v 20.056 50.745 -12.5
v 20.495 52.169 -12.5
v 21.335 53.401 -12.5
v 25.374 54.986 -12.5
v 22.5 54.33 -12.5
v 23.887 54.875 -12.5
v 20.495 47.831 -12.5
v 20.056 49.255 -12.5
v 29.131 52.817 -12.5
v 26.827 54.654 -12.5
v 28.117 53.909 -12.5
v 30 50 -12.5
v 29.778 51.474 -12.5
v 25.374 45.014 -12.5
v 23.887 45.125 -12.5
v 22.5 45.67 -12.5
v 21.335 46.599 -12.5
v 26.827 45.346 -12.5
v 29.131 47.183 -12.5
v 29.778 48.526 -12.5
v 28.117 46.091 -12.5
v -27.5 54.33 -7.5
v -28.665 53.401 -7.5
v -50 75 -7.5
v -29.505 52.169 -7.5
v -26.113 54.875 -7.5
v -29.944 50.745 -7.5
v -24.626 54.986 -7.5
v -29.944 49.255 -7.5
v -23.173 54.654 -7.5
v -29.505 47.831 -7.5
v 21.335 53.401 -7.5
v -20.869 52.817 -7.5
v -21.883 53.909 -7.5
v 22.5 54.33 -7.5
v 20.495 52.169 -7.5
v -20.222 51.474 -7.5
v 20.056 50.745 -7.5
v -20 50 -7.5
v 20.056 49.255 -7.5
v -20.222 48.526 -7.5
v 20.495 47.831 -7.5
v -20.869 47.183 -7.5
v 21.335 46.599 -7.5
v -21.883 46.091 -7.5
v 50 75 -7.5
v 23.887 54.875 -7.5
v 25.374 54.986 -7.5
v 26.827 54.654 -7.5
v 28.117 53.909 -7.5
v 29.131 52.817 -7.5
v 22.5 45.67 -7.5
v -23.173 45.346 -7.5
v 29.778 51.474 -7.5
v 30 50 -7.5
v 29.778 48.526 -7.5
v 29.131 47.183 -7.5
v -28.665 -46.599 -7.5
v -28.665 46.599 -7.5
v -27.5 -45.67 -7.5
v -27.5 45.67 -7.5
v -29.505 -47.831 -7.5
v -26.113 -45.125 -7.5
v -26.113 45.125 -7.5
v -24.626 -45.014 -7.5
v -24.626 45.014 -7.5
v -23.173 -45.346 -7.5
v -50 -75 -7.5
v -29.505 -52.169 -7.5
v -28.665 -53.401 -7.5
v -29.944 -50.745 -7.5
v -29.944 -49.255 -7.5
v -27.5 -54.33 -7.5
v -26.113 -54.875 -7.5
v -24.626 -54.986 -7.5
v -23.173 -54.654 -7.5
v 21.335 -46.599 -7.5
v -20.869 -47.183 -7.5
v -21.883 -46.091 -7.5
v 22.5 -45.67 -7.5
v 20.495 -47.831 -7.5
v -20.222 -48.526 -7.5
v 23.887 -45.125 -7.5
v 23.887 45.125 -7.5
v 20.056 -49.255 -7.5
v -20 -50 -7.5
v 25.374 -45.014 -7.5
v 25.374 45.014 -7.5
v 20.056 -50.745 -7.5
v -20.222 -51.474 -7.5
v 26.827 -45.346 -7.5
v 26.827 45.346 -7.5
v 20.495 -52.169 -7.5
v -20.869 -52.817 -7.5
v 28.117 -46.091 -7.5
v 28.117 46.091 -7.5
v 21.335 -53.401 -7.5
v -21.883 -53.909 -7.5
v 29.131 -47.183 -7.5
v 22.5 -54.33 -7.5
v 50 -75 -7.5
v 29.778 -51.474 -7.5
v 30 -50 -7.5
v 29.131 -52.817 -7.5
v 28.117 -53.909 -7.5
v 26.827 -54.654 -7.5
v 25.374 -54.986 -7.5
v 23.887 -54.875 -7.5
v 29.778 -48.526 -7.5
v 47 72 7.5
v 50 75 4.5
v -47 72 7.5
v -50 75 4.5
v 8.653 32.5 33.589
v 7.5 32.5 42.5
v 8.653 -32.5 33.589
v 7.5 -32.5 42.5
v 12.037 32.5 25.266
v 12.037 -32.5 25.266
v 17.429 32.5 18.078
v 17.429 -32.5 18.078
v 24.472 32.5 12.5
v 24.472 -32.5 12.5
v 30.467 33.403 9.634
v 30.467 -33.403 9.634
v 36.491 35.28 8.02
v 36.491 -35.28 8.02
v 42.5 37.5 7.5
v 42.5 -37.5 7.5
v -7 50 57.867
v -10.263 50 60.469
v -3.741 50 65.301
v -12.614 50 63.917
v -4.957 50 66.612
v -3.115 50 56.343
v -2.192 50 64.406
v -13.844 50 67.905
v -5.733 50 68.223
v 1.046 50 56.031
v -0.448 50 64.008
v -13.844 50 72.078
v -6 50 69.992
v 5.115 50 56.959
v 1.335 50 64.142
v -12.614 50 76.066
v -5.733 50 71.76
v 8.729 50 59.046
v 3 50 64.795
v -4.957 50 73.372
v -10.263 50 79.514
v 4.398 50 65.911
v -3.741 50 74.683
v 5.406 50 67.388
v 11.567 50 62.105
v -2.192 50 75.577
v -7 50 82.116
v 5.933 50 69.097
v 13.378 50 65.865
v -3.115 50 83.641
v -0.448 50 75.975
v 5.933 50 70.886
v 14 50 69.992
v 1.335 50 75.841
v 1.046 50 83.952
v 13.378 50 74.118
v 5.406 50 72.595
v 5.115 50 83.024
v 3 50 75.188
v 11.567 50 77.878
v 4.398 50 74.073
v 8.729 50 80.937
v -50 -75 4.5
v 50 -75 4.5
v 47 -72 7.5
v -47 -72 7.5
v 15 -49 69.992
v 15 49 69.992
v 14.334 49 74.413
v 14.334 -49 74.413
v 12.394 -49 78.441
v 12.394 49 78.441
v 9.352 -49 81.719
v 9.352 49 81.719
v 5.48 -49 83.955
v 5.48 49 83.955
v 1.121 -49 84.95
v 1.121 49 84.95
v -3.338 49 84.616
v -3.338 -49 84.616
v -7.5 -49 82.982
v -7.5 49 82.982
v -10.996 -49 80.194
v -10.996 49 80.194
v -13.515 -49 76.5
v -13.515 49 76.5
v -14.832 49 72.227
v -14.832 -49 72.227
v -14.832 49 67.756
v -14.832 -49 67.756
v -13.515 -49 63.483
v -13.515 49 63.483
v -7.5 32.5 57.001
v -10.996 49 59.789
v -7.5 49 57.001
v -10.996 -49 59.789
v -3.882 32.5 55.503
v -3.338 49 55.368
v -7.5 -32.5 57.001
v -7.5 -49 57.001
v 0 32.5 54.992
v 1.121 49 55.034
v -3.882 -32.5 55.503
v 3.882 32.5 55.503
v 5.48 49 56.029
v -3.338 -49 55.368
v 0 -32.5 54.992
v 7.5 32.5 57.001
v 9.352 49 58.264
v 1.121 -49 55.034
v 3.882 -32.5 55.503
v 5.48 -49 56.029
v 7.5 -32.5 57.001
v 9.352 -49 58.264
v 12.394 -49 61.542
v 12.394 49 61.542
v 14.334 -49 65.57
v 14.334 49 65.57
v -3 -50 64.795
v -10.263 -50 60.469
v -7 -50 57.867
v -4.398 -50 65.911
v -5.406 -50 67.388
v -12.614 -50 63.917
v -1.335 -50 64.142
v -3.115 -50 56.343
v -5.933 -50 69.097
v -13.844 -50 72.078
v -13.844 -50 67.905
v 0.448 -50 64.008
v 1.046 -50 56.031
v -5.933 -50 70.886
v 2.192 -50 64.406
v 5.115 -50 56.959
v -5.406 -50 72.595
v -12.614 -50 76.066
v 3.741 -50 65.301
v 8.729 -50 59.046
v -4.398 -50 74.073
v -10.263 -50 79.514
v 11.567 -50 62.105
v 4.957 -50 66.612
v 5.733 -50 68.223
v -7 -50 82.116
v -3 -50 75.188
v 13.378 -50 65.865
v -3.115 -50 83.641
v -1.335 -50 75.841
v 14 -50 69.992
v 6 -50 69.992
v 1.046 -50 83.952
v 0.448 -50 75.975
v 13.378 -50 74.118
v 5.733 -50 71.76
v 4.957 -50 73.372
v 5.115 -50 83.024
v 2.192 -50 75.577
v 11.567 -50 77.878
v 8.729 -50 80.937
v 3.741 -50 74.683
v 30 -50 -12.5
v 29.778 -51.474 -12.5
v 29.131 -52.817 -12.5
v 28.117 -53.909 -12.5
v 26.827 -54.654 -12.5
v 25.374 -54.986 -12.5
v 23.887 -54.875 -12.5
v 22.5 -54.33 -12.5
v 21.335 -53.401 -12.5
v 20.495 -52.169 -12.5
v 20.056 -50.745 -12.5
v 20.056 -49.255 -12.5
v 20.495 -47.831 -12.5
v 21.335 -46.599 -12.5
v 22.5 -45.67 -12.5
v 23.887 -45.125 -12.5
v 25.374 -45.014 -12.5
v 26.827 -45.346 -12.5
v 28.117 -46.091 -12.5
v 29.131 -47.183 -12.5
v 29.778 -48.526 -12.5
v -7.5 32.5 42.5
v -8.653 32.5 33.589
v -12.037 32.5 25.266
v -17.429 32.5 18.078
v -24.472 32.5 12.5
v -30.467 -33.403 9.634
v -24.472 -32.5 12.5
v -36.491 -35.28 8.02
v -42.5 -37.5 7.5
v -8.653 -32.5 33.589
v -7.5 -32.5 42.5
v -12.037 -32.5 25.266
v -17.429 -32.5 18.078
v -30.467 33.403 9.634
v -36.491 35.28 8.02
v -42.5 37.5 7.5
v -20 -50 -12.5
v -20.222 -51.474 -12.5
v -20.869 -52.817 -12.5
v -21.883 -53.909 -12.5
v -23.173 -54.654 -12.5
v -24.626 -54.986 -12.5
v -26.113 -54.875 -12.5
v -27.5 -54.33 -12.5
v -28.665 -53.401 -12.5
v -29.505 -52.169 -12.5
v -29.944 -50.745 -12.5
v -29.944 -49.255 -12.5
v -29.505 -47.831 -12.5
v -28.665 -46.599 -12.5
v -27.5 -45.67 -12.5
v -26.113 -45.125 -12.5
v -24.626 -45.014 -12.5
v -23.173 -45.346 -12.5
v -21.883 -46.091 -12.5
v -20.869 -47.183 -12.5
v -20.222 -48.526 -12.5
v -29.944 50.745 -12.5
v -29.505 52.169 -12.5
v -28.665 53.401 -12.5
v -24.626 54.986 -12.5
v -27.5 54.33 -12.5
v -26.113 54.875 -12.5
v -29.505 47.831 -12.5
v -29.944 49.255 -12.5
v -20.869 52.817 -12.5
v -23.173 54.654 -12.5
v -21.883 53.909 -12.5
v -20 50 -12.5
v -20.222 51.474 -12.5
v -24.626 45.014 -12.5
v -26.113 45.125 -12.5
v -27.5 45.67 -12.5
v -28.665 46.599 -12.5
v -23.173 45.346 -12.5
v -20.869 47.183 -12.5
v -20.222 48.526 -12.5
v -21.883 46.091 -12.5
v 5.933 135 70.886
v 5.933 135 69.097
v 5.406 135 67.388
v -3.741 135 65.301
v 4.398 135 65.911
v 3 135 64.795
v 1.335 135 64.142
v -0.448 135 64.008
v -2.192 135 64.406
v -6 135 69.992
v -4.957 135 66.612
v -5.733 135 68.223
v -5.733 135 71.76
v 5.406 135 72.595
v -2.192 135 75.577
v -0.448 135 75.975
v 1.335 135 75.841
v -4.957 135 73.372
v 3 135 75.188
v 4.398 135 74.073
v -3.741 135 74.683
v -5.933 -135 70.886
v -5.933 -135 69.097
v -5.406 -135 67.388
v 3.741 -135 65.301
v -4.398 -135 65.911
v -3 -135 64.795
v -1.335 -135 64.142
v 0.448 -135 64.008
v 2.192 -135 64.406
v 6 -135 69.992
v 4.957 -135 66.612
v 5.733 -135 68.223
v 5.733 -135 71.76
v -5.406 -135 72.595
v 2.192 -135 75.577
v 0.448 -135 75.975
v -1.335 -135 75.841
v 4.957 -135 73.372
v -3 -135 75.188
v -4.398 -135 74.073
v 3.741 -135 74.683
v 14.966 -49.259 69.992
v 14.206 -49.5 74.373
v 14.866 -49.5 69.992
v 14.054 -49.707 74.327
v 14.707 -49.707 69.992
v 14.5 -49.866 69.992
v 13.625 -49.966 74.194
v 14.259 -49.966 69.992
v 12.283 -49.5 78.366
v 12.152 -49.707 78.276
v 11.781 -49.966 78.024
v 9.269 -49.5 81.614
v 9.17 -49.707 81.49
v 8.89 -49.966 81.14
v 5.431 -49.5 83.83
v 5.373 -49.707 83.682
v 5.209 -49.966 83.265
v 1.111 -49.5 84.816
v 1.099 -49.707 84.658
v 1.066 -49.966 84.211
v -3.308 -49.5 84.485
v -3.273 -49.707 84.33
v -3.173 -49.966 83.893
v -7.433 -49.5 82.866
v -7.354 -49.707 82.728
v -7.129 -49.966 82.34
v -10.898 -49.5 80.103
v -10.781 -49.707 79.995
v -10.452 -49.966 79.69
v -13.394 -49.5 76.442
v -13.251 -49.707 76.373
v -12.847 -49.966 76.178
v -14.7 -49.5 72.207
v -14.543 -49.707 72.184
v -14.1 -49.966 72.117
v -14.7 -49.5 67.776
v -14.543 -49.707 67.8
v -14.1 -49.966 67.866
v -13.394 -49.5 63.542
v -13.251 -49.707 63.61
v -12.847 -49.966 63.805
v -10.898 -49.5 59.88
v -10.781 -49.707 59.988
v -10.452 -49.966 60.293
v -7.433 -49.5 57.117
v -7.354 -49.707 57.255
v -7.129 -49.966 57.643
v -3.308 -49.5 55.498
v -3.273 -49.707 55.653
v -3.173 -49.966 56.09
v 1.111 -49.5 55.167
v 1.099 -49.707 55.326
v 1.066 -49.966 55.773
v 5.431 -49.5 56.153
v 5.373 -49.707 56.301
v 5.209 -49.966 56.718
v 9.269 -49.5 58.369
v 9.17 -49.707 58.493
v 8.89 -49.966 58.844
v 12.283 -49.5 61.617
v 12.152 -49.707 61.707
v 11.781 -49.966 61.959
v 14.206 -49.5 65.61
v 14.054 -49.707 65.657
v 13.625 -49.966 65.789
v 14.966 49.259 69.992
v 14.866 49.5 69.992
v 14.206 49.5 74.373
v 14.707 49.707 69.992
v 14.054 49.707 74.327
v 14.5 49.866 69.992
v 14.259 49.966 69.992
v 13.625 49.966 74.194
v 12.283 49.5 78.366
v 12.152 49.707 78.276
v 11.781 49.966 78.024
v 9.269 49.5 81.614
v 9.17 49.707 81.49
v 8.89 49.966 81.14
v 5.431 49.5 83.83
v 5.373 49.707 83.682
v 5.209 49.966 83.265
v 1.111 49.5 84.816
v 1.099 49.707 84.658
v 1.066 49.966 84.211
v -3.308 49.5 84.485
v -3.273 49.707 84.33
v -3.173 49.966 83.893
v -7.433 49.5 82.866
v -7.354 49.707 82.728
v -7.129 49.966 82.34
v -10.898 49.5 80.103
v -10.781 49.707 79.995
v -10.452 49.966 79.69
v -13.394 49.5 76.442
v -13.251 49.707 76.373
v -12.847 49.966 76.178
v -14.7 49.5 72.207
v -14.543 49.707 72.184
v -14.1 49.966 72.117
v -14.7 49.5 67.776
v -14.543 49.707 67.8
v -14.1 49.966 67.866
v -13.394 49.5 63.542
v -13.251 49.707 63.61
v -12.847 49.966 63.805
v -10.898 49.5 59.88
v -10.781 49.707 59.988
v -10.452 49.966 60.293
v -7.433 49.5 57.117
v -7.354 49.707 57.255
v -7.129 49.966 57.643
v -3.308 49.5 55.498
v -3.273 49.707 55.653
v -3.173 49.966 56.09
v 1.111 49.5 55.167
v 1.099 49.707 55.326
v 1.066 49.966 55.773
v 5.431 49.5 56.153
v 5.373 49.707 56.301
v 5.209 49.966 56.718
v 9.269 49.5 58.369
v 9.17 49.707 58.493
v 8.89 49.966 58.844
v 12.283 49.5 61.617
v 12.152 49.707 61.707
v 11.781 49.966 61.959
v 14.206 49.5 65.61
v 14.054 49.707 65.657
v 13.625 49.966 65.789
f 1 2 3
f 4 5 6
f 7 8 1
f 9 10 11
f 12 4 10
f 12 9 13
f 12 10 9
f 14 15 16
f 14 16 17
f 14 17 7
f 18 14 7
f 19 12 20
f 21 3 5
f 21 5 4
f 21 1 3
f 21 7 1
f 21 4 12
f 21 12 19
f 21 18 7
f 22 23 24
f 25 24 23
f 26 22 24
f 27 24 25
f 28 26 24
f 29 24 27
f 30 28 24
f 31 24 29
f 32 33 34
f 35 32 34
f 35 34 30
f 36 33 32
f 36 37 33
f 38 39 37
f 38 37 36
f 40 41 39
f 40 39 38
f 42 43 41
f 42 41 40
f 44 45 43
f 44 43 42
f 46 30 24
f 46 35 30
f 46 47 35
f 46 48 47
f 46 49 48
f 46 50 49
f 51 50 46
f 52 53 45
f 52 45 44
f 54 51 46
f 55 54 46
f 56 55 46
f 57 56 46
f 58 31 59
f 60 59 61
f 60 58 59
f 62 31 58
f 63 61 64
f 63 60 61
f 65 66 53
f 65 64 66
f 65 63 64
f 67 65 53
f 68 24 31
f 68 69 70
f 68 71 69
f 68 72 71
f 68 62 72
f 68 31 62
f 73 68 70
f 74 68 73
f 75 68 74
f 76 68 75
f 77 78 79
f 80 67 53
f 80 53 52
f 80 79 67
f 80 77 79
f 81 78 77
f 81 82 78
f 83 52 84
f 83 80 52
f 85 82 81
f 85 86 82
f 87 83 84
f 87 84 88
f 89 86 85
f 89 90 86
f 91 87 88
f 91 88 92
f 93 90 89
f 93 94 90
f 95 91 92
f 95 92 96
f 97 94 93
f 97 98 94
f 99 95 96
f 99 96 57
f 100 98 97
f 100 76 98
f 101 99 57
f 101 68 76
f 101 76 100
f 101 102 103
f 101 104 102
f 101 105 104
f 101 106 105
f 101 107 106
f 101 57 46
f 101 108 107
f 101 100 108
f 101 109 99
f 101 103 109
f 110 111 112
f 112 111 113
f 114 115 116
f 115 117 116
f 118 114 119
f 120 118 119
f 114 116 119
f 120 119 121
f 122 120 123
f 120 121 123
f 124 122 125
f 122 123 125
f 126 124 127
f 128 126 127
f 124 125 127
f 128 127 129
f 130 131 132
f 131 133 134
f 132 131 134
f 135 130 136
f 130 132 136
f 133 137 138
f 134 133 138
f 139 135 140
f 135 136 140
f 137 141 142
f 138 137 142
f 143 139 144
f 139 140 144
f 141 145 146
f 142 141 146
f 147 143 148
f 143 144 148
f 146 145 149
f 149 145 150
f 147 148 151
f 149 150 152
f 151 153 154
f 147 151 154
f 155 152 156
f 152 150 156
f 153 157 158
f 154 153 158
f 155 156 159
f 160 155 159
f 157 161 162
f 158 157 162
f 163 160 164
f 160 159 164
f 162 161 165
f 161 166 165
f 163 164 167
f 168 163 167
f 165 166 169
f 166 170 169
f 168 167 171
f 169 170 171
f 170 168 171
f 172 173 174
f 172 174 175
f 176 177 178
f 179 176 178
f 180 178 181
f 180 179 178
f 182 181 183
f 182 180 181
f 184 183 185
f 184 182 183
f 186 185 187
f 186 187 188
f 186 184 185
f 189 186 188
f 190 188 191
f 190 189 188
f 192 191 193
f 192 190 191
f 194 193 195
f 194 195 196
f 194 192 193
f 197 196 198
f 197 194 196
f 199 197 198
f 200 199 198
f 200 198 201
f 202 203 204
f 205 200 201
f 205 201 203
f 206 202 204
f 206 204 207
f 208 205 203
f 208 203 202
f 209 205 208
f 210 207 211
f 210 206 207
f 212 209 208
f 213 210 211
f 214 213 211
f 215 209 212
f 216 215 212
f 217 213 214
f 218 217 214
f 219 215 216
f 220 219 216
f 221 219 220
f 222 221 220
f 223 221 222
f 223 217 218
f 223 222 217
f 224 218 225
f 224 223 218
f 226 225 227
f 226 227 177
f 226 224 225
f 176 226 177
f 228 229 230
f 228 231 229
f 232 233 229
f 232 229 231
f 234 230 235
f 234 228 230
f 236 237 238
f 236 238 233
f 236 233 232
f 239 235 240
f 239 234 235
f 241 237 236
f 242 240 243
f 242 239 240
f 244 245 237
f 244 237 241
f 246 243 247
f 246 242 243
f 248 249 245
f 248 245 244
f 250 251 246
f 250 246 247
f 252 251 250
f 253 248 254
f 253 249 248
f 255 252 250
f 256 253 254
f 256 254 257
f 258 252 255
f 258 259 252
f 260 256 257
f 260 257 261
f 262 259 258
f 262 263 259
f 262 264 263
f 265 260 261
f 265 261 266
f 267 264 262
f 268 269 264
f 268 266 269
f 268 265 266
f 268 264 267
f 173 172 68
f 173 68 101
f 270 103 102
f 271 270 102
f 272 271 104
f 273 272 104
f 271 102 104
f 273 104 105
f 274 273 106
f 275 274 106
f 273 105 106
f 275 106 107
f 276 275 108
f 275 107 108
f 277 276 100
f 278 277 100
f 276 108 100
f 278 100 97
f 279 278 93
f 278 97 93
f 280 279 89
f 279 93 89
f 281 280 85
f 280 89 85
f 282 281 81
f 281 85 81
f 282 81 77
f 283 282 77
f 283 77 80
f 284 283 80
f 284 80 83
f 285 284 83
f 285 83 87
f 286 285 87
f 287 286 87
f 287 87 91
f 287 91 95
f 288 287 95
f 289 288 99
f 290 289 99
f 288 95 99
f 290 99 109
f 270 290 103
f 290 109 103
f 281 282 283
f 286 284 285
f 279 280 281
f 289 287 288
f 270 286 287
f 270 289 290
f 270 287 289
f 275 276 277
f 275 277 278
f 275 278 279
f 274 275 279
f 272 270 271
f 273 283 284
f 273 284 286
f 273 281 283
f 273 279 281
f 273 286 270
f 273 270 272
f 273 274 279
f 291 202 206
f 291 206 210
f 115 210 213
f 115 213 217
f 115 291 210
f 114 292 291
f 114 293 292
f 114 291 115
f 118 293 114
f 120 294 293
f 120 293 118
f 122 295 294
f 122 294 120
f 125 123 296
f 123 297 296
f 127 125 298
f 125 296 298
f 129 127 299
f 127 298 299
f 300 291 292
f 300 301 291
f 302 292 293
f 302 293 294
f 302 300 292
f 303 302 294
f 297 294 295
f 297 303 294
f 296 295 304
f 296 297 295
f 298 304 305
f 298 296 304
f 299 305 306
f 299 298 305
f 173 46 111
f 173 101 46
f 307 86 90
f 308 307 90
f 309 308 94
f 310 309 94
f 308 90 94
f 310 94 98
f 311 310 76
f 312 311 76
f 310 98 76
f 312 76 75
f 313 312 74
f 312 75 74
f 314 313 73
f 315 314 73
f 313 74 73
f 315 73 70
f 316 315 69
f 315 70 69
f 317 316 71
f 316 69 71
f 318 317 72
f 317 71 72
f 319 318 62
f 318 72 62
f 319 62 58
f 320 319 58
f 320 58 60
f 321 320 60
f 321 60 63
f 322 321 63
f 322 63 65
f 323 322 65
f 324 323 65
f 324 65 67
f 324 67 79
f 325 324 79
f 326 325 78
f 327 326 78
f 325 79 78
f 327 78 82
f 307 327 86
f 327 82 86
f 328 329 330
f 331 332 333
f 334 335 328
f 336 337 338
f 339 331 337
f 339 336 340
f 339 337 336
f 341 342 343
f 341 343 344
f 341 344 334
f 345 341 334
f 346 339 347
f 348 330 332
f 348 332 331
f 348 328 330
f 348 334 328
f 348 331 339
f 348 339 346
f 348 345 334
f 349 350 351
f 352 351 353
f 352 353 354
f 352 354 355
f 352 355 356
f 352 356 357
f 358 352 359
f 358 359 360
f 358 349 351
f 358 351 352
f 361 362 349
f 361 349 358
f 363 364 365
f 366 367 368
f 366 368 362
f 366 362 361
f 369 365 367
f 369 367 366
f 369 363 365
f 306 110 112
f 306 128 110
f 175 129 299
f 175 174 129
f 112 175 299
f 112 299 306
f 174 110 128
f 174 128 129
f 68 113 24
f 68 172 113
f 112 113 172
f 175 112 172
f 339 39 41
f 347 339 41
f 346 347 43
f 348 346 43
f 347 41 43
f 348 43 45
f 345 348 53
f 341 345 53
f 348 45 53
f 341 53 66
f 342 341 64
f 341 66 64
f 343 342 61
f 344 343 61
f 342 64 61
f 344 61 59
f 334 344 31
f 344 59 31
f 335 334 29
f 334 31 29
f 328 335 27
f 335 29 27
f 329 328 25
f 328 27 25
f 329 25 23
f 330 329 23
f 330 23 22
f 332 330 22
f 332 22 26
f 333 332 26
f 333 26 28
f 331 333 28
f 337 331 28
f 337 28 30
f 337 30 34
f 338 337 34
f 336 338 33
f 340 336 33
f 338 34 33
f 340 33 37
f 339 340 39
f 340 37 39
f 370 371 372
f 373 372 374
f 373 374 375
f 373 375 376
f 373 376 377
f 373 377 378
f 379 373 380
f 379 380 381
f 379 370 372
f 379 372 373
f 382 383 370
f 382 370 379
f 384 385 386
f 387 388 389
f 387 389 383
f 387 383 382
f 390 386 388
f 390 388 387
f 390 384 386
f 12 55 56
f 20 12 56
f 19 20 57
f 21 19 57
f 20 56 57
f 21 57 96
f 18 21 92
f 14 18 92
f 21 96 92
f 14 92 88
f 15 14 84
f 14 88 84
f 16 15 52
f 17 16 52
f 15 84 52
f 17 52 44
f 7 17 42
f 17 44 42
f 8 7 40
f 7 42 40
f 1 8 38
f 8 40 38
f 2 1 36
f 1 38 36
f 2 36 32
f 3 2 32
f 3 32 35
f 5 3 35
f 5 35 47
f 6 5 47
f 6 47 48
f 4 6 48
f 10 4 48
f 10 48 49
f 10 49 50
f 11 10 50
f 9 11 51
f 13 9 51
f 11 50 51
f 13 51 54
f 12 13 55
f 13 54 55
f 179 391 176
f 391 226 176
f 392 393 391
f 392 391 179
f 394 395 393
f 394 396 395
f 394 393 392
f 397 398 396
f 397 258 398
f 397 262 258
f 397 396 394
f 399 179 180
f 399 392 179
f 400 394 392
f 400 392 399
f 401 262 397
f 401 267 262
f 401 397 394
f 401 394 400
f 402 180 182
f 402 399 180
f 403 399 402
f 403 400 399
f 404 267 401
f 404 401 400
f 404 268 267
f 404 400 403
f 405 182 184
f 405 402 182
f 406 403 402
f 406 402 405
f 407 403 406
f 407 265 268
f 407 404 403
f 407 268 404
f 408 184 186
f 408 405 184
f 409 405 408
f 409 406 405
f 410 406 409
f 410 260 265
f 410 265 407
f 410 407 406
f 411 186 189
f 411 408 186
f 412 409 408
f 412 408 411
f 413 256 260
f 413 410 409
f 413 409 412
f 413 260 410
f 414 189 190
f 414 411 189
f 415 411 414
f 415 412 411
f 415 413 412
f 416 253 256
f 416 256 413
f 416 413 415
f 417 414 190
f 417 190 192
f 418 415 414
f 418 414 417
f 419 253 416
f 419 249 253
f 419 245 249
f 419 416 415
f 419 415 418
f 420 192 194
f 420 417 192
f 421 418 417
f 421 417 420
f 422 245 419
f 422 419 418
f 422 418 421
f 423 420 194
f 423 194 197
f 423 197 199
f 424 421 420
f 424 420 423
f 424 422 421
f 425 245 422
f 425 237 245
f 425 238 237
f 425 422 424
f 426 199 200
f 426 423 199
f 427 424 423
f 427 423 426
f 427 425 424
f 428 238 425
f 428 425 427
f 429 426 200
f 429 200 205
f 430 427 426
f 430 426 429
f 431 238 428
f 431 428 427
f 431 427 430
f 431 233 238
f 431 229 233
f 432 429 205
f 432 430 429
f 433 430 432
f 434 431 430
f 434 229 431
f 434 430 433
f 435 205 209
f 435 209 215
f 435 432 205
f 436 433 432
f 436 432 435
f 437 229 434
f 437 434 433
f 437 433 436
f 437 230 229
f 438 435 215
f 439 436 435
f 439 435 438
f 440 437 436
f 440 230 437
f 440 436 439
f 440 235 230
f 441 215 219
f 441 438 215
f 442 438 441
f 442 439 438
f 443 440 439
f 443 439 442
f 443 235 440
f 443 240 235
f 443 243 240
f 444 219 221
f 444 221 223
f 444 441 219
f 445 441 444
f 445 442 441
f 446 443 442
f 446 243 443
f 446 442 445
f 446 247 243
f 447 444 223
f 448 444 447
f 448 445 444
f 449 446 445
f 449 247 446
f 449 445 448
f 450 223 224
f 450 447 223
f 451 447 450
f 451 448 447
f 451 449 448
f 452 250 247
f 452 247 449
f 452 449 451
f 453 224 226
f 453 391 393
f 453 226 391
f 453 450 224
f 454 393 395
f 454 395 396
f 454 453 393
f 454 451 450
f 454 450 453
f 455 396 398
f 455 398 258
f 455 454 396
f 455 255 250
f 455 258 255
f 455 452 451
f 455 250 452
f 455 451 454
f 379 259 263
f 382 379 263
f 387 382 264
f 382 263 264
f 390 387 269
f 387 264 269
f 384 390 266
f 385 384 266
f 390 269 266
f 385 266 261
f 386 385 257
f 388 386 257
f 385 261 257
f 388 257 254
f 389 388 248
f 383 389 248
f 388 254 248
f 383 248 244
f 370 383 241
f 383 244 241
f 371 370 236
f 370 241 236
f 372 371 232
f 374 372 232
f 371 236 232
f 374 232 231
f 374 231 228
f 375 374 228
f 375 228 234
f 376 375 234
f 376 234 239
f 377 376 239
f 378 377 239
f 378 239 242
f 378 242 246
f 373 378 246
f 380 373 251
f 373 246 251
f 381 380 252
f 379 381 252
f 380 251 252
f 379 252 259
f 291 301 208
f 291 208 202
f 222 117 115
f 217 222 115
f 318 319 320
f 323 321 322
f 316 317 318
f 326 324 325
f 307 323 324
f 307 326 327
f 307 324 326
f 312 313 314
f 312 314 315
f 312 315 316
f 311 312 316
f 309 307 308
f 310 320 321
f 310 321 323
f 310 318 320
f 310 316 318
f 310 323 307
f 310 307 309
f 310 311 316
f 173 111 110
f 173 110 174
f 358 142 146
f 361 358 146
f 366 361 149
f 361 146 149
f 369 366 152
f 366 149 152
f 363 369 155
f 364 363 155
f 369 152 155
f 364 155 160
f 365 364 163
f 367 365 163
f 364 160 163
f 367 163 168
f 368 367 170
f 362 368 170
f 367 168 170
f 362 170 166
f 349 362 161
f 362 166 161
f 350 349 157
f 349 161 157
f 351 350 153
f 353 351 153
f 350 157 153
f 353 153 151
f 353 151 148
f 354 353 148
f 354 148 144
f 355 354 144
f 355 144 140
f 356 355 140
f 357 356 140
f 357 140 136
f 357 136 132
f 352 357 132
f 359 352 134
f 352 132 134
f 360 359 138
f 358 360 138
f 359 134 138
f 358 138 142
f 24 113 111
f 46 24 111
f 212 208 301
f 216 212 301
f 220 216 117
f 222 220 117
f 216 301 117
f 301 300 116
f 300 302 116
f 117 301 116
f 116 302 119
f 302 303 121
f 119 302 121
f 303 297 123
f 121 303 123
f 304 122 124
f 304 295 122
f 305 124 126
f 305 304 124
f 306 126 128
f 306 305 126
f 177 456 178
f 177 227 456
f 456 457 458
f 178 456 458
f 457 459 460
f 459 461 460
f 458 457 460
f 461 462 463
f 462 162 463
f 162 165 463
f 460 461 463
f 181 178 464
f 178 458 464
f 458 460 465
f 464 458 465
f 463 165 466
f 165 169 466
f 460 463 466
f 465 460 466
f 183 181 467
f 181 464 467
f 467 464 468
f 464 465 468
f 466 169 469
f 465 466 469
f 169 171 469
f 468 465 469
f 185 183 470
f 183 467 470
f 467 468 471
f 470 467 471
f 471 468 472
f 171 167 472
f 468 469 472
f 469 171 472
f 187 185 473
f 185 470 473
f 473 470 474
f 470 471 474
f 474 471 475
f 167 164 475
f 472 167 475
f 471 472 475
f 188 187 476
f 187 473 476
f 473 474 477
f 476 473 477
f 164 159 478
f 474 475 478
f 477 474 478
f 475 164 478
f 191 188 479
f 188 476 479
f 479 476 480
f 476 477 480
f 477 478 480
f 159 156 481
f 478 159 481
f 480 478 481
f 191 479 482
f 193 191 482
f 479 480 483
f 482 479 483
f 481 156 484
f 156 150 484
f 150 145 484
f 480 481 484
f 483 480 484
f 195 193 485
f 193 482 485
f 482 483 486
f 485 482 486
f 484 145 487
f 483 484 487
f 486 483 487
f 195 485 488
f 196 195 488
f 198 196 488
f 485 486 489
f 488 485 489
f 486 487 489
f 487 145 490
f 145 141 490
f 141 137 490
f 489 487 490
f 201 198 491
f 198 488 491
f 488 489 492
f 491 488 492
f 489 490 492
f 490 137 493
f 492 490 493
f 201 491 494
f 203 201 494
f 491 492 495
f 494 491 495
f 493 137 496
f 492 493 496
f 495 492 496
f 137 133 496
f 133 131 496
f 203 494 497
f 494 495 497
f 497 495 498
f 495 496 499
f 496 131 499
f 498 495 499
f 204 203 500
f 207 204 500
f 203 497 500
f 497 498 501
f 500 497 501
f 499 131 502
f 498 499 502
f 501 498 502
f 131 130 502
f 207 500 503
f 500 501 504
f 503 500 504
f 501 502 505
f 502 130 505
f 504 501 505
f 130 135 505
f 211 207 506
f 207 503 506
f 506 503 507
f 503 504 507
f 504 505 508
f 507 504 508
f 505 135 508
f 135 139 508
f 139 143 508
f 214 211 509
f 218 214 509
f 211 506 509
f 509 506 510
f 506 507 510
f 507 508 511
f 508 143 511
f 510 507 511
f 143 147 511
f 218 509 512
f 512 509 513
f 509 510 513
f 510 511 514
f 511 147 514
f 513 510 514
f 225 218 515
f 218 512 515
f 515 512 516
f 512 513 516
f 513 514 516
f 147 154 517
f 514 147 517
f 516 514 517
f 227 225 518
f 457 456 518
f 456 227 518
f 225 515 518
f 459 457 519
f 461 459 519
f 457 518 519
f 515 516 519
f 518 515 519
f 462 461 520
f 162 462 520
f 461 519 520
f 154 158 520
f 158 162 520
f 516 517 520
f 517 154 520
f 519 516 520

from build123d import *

# Parameters (mm, degrees)
F1_DEPTH  = 75
F2_W      = 15
F2_H      = 65
F3_DEPTH  = 70
F4_R      = 15
F5_DEPTH  = 50
F6_R      = 6
F7_DEPTH  = 85
F8_R      = 6
F9_DEPTH  = 85
F10_R     = 5
F11_DEPTH = 5
F12_R     = 35
F13_R     = 5
F14_SIZE  = 3
F15_R     = 1


with BuildPart() as f1:
    # F0 (on Front) → F1 (new body, symmetric)
    with BuildSketch(Plane.XZ):
        Polygon((50, -7.5), (50, 7.5), (-50, 7.5), (-50, -7.5), (-27.5, -7.5), (27.5, -7.5), align=None)
    extrude(amount=F1_DEPTH, both=True)

    # F2 (on Top) → F3 (join)
    with BuildSketch(Plane.XY):
        Rectangle(F2_W, F2_H)
    extrude(amount=F3_DEPTH)

    # F4 (on Front) → F5 (join, symmetric)
    with BuildSketch(Plane.XZ):
        with Locations((0, 69.991633)):
            Circle(F4_R)
    extrude(amount=F5_DEPTH, both=True)

    # F6 (on face) → F7 (join)
    with BuildSketch(Plane(origin=(0, 50, 0), x_dir=(-1, 0, 0), z_dir=(0, 1, 0))):
        with Locations((0, 69.991633)):
            Circle(F6_R)
    extrude(amount=F7_DEPTH)

    # F8 (on face) → F9 (join)
    with BuildSketch(Plane.XZ.offset(50)):
        with Locations((0, 69.991633)):
            Circle(F8_R)
    extrude(amount=F9_DEPTH)

    # F10 (on face) → F11 (join)
    with BuildSketch(Plane(origin=(0, 0, -7.5), x_dir=(1, 0, 0), z_dir=(0, 0, -1))):
        with Locations((-25, 50)):
            Circle(F10_R)
        with Locations((25, 50)):
            Circle(F10_R)
        with Locations((-25, -50)):
            Circle(F10_R)
        with Locations((25, -50)):
            Circle(F10_R)
    extrude(amount=F11_DEPTH)

    # F12
    f12_edges = [f1.edges().sort_by_distance(p)[0] for p in [
        (7.5, 0, 7.5),
        (-7.5, 0, 7.5),
    ]]
    fillet(f12_edges, radius=F12_R)

    # F13
    f13_edges = [f1.edges().sort_by_distance(p)[0] for p in [
        (25, -32.5, 7.5),
        (0, -32.5, 7.5),
        (-25, -32.5, 7.5),
        (25, 32.5, 7.5),
        (0, 32.5, 7.5),
        (-25, 32.5, 7.5),
    ]]
    fillet(f13_edges, radius=F13_R)

    # F14
    f14_edges = [f1.edges().sort_by_distance(p)[0] for p in [
        (-50, 0, 7.5),
        (0, 75, 7.5),
        (50, 0, 7.5),
        (0, -75, 7.5),
    ]]
    chamfer(f14_edges, length=F14_SIZE)

    # F15
    f15_edges = [f1.edges().sort_by_distance(p)[0] for p in [
        (-15, -50, 69.991633),
        (-15, 50, 69.991633),
    ]]
    fillet(f15_edges, radius=F15_R)


solid = f1.part
